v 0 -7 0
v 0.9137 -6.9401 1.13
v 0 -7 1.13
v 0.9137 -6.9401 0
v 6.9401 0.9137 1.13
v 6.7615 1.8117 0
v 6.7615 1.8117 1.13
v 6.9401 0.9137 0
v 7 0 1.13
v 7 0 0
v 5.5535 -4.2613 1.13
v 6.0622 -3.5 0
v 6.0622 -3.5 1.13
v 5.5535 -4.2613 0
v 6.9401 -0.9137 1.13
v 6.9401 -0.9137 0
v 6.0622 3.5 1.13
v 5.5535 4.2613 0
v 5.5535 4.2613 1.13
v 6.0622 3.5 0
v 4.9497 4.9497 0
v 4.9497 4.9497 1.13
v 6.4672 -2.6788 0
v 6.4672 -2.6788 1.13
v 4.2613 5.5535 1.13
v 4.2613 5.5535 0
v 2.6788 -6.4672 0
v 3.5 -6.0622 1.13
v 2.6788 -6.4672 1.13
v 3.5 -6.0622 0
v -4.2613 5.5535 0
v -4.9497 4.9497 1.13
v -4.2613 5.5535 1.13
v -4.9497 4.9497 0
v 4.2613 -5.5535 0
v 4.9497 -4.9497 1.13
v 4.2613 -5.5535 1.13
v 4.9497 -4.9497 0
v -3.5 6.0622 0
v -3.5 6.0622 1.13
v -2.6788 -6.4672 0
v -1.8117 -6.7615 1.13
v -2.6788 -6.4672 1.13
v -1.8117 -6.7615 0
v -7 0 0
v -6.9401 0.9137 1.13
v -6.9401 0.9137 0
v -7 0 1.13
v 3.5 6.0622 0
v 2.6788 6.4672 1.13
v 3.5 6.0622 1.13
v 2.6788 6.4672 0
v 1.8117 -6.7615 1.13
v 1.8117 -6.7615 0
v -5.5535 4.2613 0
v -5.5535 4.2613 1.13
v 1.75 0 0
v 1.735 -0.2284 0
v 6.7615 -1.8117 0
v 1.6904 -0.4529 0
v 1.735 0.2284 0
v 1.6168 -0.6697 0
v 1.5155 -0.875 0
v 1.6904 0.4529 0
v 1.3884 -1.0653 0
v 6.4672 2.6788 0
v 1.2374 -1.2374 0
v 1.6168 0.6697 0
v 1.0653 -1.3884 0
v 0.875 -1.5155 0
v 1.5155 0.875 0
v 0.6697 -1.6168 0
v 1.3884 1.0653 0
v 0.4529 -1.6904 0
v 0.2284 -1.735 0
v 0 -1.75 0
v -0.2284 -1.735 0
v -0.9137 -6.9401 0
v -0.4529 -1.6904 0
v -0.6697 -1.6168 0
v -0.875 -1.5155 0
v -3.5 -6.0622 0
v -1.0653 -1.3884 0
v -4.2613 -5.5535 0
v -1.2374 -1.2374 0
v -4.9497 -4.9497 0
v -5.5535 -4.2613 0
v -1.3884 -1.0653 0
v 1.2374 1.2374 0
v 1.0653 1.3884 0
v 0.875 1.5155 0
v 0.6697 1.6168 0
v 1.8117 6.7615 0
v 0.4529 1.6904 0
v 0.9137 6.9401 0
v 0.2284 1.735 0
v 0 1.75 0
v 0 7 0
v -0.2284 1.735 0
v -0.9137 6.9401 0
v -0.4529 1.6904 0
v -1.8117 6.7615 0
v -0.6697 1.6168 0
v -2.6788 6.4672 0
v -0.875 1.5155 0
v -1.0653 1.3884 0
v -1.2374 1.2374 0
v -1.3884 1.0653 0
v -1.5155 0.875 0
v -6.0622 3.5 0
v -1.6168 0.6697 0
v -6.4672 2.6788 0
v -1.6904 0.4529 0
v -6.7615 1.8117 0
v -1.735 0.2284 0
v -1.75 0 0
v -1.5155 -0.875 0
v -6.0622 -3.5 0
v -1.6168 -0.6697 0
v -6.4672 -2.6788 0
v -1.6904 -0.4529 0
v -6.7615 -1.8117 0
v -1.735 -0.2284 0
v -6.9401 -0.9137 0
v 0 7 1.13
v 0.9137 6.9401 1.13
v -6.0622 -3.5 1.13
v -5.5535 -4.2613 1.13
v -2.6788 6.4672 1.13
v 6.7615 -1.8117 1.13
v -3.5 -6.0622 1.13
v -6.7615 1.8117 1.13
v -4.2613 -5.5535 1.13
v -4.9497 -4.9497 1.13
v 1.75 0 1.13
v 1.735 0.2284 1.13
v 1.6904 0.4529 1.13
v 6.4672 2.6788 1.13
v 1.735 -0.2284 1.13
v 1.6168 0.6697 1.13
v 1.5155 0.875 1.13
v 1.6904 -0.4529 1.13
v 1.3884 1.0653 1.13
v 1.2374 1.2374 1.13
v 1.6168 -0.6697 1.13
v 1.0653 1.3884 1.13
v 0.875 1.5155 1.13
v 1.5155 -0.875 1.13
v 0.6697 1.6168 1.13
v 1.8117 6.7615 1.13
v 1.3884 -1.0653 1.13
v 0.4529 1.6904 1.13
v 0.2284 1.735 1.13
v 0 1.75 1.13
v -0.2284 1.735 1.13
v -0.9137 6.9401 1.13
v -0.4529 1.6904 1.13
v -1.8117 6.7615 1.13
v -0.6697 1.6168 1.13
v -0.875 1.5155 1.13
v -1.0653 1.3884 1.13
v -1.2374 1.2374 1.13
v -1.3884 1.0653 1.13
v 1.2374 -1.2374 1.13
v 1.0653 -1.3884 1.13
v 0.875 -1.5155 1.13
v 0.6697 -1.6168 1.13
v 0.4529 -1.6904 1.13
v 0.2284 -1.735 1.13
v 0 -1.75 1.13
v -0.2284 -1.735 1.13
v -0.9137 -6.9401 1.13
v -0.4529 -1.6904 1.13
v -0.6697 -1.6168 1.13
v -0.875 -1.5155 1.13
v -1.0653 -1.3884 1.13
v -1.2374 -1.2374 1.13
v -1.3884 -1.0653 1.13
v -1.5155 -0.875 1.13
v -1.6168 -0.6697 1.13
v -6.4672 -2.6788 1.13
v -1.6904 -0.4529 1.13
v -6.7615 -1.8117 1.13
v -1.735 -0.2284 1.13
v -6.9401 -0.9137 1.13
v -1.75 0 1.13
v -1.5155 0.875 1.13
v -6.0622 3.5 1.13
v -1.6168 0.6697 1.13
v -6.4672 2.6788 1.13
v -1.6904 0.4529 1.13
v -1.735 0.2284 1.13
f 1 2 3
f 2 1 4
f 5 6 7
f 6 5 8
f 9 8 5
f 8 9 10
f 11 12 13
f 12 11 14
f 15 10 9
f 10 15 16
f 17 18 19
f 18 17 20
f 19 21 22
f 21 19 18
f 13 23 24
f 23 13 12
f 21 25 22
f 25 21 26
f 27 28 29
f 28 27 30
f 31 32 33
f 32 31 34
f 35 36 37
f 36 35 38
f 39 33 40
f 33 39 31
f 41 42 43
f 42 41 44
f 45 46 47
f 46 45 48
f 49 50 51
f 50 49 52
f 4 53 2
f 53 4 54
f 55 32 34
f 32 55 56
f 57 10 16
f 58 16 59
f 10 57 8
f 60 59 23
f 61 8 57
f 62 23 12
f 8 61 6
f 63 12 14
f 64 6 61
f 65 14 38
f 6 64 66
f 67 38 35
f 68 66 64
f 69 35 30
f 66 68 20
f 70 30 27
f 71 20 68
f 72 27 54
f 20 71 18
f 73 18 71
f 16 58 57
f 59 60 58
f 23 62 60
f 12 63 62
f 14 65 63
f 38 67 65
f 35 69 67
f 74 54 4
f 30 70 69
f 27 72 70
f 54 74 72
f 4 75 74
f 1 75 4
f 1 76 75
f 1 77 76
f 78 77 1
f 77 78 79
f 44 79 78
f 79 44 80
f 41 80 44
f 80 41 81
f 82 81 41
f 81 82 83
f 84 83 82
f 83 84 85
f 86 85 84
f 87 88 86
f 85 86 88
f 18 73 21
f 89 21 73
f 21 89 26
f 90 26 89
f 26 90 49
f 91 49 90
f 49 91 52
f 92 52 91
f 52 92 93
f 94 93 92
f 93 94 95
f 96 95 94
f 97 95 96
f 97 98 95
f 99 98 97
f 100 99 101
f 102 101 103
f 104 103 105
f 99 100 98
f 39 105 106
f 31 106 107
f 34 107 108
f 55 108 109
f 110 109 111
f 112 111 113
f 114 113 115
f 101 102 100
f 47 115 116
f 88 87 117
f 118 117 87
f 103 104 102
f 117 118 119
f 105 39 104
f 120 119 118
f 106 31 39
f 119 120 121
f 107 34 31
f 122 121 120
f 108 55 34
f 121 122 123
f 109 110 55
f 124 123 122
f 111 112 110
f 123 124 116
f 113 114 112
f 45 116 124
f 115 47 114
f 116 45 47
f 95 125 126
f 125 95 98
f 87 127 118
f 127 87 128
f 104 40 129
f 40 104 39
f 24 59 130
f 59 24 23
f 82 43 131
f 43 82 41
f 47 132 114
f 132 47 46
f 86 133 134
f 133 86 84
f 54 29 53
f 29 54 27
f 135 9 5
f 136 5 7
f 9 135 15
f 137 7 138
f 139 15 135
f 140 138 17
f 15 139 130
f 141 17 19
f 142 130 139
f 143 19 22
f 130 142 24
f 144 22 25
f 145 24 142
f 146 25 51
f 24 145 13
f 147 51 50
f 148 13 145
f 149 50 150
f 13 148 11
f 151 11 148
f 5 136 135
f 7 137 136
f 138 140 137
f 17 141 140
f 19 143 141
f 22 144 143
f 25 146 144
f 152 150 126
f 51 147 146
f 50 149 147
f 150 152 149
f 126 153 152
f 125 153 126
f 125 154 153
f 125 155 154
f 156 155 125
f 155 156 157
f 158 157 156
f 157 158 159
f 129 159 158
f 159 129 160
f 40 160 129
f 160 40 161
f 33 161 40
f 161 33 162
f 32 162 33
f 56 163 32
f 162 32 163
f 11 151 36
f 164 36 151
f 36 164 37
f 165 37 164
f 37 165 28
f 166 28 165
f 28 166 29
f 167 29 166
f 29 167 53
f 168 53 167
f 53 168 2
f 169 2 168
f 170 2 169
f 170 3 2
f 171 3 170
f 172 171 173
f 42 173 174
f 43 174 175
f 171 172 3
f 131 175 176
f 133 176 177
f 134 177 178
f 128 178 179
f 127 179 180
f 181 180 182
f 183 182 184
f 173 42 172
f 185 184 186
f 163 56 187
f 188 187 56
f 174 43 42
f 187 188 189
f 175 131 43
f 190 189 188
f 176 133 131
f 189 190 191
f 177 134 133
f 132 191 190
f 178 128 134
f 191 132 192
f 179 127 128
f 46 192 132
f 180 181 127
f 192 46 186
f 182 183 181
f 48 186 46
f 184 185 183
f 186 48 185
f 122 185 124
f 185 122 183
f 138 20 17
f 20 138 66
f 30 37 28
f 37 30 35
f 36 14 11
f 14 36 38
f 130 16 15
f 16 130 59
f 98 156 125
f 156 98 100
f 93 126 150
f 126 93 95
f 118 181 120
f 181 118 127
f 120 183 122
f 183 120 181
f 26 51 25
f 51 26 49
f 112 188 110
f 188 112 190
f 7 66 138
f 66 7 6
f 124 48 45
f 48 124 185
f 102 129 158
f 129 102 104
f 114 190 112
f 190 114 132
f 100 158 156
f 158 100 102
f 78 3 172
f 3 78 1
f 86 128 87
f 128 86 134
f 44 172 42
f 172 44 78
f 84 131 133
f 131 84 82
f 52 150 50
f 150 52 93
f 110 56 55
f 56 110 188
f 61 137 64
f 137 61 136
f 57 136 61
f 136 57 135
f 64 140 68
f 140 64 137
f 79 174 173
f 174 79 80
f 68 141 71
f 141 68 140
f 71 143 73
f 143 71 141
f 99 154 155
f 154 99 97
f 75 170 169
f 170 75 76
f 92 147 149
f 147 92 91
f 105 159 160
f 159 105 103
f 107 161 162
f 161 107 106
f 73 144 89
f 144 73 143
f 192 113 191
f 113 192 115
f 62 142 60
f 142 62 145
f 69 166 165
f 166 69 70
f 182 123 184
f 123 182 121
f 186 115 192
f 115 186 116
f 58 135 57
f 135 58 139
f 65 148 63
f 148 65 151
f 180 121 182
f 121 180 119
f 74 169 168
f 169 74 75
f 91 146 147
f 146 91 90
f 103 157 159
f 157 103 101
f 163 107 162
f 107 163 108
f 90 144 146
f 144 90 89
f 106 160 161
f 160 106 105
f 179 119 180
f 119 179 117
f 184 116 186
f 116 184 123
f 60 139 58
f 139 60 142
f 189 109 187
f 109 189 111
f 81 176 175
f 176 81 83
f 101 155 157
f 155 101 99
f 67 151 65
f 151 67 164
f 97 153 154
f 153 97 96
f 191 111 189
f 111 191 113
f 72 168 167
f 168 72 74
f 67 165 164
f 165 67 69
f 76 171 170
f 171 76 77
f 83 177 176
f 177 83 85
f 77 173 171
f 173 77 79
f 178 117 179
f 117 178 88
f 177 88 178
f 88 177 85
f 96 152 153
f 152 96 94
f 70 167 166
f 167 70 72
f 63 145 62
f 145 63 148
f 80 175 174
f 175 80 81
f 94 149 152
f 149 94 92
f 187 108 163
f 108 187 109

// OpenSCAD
// file: parameters.scad
// =============================================================================
// Gen-AS Vernier flux-claw ultra - WOUND-AWARE (HARD GATE)
// Dual-rotor vernier: Rotor B +22.5 deg vs 12-slot stator; O5 flux claws
// =============================================================================

wire_awg            = 26;
wire_od             = 0.45;
turns               = 200;      // +5 vs Gen-AP 195
fill                = 0.70;
layers_per_face     = 2;
wind_build_axial    = layers_per_face * wire_od * fill;   // 0.63 mm
wind_build_radial   = 3 * wire_od * fill;                 // 0.945 mm

coil_id_r           = 15.5;
coil_od_r           = 62.5;
span_deg            = 25.0;
former_web          = 1.25;     // thinner vs AP 1.30
flange_t            = 0.60;
wall                = 1.2;
slot_w              = 2.4;
mount_hole          = 3.5;
tab_len             = 7.0;

former_bare_h       = former_web + 2 * flange_t;            // 2.45 mm
coil_envelope_h     = former_bare_h + 2 * wind_build_axial; // 3.71 mm

run_clear           = 0.50;
gap_spacer_h        = run_clear + wind_build_axial;         // 1.13 mm
m2m                 = coil_envelope_h + 2 * run_clear;      // 4.71 mm

coil_stations       = 12;
bay_r_in            = coil_id_r - 2.0 - wind_build_radial;
bay_r_out           = coil_od_r + 2.0 + wind_build_radial;
bay_span            = span_deg + 4.0;
bay_offset          = 2.0;
stator_thick        = former_bare_h;
stator_od           = 160.0;
shaft_clear_stator  = 34.0;
coil_mount_r        = 25.5;

large_pocket_d      = 20.3;
small_pocket_d      = 5.3;
pocket_h            = 5.2;
large_n             = 8;
R_large             = 39.0;     // closer to copper centroid vs AP R=39.5
R_small_inner       = 25.0;
R_small_mid         = 39.0;
R_small_outer       = 55.0;
carrier_od          = 156.0;
carrier_thick       = 7.5;
hub_h               = 10.0;
hub_od              = 30.0;
rotor_b_offset_deg  = 22.5;     // vernier offset vs 12-slot stator

shaft_bore          = 8.35;
bearing_d           = 21.85;
bearing_h           = 7.2;
m3_clear            = 3.5;
bolt_r_inner        = 36.0;
bolt_n_inner        = 6;
flange_bolt_r       = 72.0;
flange_bolt_n       = 6;
brace_r             = 68.0;
brace_d             = 4.3;
brace_n             = 4;

spacer_pad_od       = 14.0;
spacer_pad_id       = m3_clear;
endbell_od          = 160.0;
endbell_thick       = 8.0;
endbell_shaft_clear = 10.0;

$fn = 64;
// main file
// Gen-AS gap spacer — h = run_clear + wind_build_axial
include <parameters.scad>;
$fn = 48;
difference() {
    cylinder(d=spacer_pad_od, h=gap_spacer_h);
    translate([0, 0, -0.1]) cylinder(d=spacer_pad_id, h=gap_spacer_h + 0.2);
}
